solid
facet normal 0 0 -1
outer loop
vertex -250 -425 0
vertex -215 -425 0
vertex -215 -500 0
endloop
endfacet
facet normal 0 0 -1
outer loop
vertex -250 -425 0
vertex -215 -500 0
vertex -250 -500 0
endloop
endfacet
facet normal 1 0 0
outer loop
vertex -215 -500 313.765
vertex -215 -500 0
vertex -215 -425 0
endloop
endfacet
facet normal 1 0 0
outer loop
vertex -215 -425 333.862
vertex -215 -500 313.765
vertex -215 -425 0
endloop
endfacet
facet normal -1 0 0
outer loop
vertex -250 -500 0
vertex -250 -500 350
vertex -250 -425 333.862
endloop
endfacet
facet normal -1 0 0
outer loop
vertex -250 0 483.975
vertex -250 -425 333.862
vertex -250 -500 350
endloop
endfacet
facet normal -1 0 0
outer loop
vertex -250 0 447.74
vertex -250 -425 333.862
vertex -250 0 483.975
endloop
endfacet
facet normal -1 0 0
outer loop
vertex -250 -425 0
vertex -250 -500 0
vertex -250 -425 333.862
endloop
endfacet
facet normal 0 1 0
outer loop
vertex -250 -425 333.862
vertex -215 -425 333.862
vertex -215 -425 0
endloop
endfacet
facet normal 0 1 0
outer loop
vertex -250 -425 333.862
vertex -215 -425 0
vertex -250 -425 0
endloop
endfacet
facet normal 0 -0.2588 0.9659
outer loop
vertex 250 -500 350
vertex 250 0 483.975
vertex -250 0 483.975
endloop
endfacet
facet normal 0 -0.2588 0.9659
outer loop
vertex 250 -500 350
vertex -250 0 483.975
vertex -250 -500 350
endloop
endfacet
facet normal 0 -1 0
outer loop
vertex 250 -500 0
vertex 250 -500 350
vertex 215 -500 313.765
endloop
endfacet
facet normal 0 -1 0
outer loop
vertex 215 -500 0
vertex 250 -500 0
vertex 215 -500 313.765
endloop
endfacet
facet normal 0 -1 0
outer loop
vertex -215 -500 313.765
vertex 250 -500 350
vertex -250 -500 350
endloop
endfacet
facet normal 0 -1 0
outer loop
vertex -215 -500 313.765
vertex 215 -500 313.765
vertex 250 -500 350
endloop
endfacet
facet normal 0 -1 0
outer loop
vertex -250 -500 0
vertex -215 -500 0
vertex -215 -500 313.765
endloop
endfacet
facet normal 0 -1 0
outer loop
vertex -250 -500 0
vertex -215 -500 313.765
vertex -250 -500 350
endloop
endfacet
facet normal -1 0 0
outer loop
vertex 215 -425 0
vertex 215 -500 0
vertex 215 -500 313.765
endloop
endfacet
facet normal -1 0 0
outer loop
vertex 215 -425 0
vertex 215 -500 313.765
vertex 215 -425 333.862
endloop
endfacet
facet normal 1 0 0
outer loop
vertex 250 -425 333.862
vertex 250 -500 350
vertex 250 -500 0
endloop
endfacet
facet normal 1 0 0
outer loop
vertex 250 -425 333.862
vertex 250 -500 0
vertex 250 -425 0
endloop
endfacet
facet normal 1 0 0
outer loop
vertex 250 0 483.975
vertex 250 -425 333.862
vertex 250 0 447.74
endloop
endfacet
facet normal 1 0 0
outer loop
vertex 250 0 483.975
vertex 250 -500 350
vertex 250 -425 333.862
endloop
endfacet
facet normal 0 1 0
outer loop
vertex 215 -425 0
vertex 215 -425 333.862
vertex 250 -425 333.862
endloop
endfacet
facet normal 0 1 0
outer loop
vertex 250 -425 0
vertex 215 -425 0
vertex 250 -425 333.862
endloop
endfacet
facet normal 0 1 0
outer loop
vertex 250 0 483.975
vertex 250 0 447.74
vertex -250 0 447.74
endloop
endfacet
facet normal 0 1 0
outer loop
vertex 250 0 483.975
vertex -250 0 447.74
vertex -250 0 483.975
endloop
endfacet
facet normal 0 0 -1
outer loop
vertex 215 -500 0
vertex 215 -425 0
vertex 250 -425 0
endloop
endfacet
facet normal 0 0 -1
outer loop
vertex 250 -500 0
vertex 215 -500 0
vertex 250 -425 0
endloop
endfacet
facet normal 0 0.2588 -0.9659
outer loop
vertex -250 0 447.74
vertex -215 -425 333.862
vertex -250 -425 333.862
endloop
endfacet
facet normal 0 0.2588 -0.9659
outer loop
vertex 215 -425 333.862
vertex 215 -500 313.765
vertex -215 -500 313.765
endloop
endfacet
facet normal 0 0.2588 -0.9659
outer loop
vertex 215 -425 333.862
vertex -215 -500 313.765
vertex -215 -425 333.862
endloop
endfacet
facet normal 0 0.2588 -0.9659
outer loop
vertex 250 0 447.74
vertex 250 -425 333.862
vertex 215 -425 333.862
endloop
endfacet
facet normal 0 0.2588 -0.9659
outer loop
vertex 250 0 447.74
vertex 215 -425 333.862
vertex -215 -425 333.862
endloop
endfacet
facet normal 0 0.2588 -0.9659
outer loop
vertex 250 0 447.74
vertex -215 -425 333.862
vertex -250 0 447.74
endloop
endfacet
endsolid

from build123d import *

# Parameters (mm, degrees)
F3_DEPTH = 250
F4_W     = 35
F4_H     = 75


# Not quite as in the source:
# - a pattern or mirror of a feature is missing from the dataset's text; its kind, count and spacing are read off the source's solid
# - the program builds the solid bodies; features that only make, move or delete a surface that nothing else refers to are left out


with BuildPart() as f3:
    # F2 (on Right) → F3 (new body, symmetric)
    with BuildSketch(Plane.YZ):
        Polygon((-500, 313.7653336856), (0, 447.7399299012), (0, 483.9745962156), (-500, 350), align=None)
    extrude(amount=F3_DEPTH, both=True)

    # F4 (on Top) → F5 (join, up to the next surface of F3)
    with BuildSketch(Plane.XY):
        with Locations((232.5, -462.5)):
            Rectangle(F4_W, F4_H)
    f5 = extrude(until=Until.NEXT)

    # F5_copies: F5 across plane
    add(f5.mirror(Plane(origin=(0, 0, 0), x_dir=(0, 0, -1), z_dir=(-1, 0, 0))))


solid = f3.part
